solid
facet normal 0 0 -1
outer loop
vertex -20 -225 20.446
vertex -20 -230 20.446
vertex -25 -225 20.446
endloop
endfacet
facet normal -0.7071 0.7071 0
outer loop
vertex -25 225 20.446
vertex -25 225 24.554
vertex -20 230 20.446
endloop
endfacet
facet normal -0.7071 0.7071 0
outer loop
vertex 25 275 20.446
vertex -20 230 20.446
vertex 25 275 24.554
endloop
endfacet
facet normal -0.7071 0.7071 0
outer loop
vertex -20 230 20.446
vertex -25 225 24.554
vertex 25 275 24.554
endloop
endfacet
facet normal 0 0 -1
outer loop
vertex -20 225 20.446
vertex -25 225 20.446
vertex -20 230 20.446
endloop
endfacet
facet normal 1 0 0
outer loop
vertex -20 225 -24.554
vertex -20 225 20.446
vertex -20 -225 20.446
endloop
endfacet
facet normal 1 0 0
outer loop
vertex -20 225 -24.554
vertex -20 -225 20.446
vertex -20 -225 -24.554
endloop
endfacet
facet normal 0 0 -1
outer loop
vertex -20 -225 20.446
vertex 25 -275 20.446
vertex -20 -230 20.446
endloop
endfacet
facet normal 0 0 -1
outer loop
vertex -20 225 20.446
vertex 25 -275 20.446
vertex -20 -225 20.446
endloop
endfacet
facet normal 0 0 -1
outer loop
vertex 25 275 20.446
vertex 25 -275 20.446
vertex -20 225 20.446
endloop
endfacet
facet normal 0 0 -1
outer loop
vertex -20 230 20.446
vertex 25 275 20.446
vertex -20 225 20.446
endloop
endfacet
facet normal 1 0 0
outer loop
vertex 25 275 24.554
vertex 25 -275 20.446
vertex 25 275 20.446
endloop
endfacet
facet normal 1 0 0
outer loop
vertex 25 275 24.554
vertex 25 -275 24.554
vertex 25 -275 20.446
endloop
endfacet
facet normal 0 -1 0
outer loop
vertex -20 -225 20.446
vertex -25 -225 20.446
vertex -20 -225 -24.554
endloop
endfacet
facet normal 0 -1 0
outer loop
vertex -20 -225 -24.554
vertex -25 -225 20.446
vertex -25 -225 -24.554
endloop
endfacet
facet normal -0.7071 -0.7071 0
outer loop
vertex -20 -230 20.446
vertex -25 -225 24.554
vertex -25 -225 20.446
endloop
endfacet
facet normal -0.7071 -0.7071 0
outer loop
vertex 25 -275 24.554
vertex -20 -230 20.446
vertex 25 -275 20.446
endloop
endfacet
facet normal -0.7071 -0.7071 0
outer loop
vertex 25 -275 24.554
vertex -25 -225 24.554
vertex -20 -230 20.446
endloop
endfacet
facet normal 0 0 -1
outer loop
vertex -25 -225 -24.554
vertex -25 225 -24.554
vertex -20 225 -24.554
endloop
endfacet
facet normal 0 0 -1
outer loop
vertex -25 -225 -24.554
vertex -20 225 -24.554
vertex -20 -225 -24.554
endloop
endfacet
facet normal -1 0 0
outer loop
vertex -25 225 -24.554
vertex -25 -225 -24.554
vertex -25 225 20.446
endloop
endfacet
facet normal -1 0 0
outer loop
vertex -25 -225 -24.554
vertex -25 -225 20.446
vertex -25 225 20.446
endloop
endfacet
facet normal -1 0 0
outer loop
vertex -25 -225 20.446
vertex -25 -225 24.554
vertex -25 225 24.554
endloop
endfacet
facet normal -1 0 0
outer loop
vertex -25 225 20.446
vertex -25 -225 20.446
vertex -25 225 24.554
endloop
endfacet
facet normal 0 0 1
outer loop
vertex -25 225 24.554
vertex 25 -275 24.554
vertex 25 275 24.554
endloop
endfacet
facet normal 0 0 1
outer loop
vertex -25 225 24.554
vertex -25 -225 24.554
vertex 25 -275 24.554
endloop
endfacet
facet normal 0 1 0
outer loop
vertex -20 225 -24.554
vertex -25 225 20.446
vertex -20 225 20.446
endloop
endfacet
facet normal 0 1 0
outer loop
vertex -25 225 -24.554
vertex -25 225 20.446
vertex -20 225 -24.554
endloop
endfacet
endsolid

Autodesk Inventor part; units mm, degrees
ref_plane "YZ Plane" through (0, 0, 0) normal (1, 0, 0) x (0, 1, 0)
ref_plane "XZ Plane" through (0, 0, 0) normal (0, 1, 0) x (-1, 0, 0)
ref_plane "XY Plane" through (0, 0, 0) normal (0, 0, 1) x (1, 0, 0)
sketch "Sketch1" plane through (0, 0, 0) normal (1, 0, 0) x (0, 1, 0)
  line L0 (-275, 24.5536) -> (275, 24.5536)
  line L1 (275, 24.5536) -> (275, -24.5536)
  line L2 (275, -24.5536) -> (-275, -24.5536)
  line L3 (-275, -24.5536) -> (-275, 24.5536)
  point P0 (0, 0)
  dimension "d15" = 550
extrude "Extrusion1" add sketch "Sketch1" along normal mid plane 50
sketch "Sketch2" plane through (-25, 275, 24.5536) normal (0, 1, 0) x (1, 0, 0)
  line L0 (50, 49.1071) -> (50, 0) projected
  line L1 (50, 4.1071) -> (5, 4.1071)
  line L2 (5, 4.1071) -> (5, 49.1071)
  line L3 (50, 49.1071) -> (0, 49.1071) projected
  line L4 (5, 49.1071) -> (50, 49.1071)
  line L5 (50, 49.1071) -> (50, 4.1071)
  point P0 (25, 24.5536)
extrude "Extrusion2" cut sketch "Sketch2" against normal through all
sketch "Sketch5" plane through (-25, 0, 0) normal (-1, 0, 0) x (0, 0, 1)
  line L0 (-24.5536, 275) -> (-24.5536, -275) projected
  line L1 (20.4464, -275) -> (20.4464, 275) projected
  line L2 (-24.5536, 275) -> (20.4464, 275)
  line L3 (20.4464, 275) -> (20.4464, 225)
  line L4 (20.4464, 225) -> (-24.5536, 225)
  line L5 (-24.5536, 225) -> (-24.5536, 275)
  line L6 (-24.5536, -275) -> (24.5536, -275) projected
  line L7 (-24.5536, -275) -> (20.4464, -275)
  line L8 (20.4464, -275) -> (20.4464, -225)
  line L9 (20.4464, -225) -> (-24.5536, -225)
  line L10 (-24.5536, -225) -> (-24.5536, -275)
  point P0 (0, 0)
extrude "Extrusion5" cut sketch "Sketch5" against normal blind 10 contours L2 L1 L4 L0 | L9 L1 L6 L0
sketch "Sketch6" plane through (-25, -275, 24.5536) normal (0, 0, 1) x (1, 0, 0)
  line L0 (0, 500) -> (0, 50) projected
  line L1 (50, 0) -> (50, 550) projected
  line L2 (0, 500) -> (50, 550)
  line L3 (50, 550) -> (0, 550)
  line L4 (0, 550) -> (0, 500)
  line L5 (0, 50) -> (50, 0)
  line L6 (0, 0) -> (50, 0) projected
  line L7 (50, 0) -> (0, 0)
  line L8 (0, 0) -> (0, 50)
  point P0 (25, 275)
extrude "Extrusion6" cut sketch "Sketch6" against normal blind 5 contours L4 L3 L2 | L5 L6 L8
properties part number "angle3"
